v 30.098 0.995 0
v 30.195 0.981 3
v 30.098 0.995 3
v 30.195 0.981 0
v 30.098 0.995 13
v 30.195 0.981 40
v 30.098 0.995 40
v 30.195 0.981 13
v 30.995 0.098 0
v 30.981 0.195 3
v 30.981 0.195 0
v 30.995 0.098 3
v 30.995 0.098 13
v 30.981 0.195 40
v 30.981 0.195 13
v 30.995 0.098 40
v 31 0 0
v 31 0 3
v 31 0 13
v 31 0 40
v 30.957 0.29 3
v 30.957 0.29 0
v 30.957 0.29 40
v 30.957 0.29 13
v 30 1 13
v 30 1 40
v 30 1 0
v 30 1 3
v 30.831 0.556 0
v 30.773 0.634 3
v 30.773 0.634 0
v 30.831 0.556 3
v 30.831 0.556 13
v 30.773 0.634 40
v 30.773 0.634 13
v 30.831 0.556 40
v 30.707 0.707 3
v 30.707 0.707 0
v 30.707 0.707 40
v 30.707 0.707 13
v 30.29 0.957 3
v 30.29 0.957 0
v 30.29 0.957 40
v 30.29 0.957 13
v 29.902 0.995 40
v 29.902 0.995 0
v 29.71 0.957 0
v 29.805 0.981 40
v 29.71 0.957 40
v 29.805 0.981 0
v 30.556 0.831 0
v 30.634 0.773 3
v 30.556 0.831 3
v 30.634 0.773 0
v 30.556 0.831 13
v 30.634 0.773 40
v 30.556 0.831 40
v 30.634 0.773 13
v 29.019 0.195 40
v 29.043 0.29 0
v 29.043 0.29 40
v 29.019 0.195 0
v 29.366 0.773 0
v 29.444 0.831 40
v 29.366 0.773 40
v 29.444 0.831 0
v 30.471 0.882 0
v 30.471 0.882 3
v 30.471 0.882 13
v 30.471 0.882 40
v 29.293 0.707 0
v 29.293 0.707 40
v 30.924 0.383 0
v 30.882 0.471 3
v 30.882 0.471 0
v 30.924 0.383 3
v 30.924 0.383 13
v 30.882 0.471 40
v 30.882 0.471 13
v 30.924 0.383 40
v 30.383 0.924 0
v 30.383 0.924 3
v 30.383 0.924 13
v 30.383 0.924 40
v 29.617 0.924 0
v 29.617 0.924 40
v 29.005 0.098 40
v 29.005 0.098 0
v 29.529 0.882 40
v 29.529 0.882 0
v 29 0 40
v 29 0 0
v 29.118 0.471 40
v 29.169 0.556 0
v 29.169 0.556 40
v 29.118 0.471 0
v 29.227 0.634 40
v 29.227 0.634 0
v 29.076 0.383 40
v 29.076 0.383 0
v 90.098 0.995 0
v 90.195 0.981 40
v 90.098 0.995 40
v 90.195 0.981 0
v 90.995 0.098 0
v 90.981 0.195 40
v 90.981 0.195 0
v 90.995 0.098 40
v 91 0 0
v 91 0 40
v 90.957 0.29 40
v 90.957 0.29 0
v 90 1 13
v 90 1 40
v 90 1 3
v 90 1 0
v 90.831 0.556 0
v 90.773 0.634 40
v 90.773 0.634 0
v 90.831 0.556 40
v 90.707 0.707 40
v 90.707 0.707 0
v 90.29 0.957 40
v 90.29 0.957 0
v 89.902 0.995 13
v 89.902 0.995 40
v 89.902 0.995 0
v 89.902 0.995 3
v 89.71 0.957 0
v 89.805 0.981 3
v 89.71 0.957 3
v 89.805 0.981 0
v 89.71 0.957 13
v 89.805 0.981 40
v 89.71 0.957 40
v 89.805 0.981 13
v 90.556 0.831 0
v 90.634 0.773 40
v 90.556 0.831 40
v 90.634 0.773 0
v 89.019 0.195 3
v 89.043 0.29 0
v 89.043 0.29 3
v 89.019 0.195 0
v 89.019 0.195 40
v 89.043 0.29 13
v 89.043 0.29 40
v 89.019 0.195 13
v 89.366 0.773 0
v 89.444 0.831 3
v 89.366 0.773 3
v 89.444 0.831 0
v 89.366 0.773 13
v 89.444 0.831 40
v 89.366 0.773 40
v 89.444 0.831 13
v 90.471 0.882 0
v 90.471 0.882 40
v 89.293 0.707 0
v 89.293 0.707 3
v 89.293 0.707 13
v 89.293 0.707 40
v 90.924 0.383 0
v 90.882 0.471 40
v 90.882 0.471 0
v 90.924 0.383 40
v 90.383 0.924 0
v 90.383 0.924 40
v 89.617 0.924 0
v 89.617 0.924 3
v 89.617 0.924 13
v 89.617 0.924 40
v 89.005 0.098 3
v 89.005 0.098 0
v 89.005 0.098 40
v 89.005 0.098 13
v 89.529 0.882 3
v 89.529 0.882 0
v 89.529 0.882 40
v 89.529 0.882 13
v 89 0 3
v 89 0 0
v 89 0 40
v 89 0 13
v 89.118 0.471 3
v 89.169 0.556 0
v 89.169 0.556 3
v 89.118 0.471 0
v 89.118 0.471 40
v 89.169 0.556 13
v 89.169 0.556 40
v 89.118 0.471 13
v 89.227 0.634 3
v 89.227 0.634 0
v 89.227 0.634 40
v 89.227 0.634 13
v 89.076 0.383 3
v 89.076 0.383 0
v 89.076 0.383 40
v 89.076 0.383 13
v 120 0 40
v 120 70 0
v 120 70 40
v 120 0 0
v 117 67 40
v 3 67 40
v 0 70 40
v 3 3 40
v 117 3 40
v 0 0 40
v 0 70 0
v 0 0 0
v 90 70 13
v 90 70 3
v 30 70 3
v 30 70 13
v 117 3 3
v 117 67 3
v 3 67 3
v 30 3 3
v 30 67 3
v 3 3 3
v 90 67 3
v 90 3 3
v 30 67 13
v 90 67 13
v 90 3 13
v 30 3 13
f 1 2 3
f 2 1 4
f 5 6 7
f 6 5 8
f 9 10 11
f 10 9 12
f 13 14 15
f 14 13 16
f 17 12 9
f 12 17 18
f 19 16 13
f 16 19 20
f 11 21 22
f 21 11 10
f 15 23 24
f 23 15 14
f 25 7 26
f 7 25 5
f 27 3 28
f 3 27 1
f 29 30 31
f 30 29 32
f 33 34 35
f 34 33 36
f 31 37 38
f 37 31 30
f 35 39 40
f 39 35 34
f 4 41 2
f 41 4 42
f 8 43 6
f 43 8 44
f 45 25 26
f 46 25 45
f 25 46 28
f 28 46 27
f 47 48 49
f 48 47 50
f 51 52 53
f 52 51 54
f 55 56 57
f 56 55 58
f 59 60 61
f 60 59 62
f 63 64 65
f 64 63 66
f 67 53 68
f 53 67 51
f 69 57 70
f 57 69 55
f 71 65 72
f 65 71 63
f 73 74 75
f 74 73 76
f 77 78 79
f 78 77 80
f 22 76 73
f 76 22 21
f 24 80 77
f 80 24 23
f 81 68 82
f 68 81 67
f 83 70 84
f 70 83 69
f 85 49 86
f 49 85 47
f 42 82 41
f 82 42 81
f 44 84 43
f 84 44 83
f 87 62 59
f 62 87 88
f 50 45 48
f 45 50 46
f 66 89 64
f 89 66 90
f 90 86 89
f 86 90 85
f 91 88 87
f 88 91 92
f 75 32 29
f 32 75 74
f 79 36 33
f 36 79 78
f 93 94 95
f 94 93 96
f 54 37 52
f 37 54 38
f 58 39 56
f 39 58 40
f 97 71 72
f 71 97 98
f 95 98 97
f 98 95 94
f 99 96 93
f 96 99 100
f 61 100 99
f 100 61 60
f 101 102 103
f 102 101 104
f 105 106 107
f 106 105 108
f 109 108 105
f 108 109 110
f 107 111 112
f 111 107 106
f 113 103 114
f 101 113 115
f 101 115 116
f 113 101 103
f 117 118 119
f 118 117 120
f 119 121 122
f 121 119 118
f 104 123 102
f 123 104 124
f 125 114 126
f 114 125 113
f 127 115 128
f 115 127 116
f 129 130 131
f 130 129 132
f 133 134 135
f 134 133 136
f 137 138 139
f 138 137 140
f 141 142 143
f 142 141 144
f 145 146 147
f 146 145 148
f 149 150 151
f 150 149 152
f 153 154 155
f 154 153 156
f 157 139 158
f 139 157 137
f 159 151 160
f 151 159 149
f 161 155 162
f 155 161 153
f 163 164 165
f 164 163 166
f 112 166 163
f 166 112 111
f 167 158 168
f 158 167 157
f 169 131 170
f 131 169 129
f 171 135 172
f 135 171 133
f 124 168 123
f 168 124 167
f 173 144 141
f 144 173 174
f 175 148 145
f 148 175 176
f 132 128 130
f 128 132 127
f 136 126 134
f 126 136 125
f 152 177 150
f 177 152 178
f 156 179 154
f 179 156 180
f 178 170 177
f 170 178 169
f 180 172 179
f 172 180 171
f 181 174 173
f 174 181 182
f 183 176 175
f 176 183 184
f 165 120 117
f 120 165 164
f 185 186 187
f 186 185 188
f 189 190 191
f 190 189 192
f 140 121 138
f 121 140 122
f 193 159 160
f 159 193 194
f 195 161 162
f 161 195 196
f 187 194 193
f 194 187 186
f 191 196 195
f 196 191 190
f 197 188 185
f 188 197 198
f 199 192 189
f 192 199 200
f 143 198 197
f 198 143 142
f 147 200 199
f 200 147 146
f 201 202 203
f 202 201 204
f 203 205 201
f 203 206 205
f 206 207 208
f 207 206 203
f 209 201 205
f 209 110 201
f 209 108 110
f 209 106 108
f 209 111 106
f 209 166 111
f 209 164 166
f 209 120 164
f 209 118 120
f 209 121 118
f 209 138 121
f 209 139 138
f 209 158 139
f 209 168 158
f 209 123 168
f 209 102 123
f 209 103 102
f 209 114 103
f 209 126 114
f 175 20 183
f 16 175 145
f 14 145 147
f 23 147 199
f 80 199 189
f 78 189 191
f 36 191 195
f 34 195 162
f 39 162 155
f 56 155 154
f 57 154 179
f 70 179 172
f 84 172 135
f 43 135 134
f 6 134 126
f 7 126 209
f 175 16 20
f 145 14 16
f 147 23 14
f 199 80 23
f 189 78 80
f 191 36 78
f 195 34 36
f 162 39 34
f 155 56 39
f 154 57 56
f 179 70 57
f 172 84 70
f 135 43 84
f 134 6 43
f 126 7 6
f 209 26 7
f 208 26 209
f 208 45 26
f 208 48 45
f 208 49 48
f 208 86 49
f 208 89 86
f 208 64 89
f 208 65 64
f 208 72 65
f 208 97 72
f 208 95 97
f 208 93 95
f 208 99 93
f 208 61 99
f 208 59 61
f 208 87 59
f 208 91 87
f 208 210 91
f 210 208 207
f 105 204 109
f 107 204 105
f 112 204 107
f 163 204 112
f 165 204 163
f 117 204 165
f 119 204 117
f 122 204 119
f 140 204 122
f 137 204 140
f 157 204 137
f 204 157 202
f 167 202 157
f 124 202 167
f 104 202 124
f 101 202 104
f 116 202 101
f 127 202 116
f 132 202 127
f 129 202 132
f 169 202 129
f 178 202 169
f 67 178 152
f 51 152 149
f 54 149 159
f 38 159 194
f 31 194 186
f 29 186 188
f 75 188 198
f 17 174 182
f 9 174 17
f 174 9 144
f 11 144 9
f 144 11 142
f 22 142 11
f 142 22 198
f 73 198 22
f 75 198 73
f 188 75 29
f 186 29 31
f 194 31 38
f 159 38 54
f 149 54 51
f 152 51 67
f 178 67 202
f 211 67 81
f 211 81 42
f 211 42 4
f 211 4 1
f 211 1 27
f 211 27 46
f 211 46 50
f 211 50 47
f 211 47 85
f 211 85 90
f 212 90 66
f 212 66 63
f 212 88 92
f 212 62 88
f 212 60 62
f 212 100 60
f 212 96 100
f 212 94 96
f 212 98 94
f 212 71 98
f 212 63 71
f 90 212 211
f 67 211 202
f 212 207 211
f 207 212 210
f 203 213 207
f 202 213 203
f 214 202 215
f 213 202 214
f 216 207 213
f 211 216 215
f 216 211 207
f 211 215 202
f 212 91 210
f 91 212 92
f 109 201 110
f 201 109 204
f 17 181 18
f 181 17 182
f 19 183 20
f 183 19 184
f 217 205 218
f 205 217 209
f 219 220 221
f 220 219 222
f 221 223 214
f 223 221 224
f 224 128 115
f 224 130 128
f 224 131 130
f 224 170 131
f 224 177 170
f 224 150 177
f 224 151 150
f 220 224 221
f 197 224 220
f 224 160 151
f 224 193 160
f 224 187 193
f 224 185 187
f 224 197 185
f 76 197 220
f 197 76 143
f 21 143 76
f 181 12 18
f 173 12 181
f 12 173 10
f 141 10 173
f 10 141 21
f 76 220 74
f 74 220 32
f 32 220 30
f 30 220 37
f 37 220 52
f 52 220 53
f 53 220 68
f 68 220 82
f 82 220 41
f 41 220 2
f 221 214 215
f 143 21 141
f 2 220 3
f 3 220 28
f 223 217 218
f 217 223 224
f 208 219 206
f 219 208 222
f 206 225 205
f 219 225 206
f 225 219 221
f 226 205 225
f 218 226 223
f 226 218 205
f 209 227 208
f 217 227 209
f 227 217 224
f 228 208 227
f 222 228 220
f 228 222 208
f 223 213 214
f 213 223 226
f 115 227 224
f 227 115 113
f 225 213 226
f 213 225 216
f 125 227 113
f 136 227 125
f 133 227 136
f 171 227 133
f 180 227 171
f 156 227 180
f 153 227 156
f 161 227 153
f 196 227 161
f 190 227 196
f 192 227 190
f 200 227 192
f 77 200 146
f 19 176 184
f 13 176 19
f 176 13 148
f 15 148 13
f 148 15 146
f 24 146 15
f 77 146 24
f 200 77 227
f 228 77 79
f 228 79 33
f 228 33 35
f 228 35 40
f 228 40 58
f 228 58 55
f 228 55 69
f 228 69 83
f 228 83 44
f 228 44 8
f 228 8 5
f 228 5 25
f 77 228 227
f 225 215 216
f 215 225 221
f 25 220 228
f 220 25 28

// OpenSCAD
// Buffer tank for a mini horizontal gel-electrophoresis box. Open-top rectangular tank with a
// solid raised platform in the middle that divides the bottom into two buffer chambers. Each end
// wall has a horizontal 2 mm hole for an electrode wire. NOVEL general part.
//

L     = 120;
W     = 70;
H     = 40;
wall  = 3;
floor = 3;
plat  = 60;
plat_h = 10;

$fn = 64;

inner_w = W - 2 * wall;
inner_h = H - floor;

difference() {
    cube([L, W, H]);
    translate([wall, wall, floor]) cube([L - 2 * wall, W - 2 * wall, H - floor]);     // hollow, open top
    translate([L / 2 - plat / 2, 0, floor]) cube([plat, W, plat_h]);                 // central platform (full width)
    for (x = [L * 0.25, L * 0.75])
        translate([x, 0, -1]) cylinder(h = H + 2, d = 2);                            // electrode holes
}
